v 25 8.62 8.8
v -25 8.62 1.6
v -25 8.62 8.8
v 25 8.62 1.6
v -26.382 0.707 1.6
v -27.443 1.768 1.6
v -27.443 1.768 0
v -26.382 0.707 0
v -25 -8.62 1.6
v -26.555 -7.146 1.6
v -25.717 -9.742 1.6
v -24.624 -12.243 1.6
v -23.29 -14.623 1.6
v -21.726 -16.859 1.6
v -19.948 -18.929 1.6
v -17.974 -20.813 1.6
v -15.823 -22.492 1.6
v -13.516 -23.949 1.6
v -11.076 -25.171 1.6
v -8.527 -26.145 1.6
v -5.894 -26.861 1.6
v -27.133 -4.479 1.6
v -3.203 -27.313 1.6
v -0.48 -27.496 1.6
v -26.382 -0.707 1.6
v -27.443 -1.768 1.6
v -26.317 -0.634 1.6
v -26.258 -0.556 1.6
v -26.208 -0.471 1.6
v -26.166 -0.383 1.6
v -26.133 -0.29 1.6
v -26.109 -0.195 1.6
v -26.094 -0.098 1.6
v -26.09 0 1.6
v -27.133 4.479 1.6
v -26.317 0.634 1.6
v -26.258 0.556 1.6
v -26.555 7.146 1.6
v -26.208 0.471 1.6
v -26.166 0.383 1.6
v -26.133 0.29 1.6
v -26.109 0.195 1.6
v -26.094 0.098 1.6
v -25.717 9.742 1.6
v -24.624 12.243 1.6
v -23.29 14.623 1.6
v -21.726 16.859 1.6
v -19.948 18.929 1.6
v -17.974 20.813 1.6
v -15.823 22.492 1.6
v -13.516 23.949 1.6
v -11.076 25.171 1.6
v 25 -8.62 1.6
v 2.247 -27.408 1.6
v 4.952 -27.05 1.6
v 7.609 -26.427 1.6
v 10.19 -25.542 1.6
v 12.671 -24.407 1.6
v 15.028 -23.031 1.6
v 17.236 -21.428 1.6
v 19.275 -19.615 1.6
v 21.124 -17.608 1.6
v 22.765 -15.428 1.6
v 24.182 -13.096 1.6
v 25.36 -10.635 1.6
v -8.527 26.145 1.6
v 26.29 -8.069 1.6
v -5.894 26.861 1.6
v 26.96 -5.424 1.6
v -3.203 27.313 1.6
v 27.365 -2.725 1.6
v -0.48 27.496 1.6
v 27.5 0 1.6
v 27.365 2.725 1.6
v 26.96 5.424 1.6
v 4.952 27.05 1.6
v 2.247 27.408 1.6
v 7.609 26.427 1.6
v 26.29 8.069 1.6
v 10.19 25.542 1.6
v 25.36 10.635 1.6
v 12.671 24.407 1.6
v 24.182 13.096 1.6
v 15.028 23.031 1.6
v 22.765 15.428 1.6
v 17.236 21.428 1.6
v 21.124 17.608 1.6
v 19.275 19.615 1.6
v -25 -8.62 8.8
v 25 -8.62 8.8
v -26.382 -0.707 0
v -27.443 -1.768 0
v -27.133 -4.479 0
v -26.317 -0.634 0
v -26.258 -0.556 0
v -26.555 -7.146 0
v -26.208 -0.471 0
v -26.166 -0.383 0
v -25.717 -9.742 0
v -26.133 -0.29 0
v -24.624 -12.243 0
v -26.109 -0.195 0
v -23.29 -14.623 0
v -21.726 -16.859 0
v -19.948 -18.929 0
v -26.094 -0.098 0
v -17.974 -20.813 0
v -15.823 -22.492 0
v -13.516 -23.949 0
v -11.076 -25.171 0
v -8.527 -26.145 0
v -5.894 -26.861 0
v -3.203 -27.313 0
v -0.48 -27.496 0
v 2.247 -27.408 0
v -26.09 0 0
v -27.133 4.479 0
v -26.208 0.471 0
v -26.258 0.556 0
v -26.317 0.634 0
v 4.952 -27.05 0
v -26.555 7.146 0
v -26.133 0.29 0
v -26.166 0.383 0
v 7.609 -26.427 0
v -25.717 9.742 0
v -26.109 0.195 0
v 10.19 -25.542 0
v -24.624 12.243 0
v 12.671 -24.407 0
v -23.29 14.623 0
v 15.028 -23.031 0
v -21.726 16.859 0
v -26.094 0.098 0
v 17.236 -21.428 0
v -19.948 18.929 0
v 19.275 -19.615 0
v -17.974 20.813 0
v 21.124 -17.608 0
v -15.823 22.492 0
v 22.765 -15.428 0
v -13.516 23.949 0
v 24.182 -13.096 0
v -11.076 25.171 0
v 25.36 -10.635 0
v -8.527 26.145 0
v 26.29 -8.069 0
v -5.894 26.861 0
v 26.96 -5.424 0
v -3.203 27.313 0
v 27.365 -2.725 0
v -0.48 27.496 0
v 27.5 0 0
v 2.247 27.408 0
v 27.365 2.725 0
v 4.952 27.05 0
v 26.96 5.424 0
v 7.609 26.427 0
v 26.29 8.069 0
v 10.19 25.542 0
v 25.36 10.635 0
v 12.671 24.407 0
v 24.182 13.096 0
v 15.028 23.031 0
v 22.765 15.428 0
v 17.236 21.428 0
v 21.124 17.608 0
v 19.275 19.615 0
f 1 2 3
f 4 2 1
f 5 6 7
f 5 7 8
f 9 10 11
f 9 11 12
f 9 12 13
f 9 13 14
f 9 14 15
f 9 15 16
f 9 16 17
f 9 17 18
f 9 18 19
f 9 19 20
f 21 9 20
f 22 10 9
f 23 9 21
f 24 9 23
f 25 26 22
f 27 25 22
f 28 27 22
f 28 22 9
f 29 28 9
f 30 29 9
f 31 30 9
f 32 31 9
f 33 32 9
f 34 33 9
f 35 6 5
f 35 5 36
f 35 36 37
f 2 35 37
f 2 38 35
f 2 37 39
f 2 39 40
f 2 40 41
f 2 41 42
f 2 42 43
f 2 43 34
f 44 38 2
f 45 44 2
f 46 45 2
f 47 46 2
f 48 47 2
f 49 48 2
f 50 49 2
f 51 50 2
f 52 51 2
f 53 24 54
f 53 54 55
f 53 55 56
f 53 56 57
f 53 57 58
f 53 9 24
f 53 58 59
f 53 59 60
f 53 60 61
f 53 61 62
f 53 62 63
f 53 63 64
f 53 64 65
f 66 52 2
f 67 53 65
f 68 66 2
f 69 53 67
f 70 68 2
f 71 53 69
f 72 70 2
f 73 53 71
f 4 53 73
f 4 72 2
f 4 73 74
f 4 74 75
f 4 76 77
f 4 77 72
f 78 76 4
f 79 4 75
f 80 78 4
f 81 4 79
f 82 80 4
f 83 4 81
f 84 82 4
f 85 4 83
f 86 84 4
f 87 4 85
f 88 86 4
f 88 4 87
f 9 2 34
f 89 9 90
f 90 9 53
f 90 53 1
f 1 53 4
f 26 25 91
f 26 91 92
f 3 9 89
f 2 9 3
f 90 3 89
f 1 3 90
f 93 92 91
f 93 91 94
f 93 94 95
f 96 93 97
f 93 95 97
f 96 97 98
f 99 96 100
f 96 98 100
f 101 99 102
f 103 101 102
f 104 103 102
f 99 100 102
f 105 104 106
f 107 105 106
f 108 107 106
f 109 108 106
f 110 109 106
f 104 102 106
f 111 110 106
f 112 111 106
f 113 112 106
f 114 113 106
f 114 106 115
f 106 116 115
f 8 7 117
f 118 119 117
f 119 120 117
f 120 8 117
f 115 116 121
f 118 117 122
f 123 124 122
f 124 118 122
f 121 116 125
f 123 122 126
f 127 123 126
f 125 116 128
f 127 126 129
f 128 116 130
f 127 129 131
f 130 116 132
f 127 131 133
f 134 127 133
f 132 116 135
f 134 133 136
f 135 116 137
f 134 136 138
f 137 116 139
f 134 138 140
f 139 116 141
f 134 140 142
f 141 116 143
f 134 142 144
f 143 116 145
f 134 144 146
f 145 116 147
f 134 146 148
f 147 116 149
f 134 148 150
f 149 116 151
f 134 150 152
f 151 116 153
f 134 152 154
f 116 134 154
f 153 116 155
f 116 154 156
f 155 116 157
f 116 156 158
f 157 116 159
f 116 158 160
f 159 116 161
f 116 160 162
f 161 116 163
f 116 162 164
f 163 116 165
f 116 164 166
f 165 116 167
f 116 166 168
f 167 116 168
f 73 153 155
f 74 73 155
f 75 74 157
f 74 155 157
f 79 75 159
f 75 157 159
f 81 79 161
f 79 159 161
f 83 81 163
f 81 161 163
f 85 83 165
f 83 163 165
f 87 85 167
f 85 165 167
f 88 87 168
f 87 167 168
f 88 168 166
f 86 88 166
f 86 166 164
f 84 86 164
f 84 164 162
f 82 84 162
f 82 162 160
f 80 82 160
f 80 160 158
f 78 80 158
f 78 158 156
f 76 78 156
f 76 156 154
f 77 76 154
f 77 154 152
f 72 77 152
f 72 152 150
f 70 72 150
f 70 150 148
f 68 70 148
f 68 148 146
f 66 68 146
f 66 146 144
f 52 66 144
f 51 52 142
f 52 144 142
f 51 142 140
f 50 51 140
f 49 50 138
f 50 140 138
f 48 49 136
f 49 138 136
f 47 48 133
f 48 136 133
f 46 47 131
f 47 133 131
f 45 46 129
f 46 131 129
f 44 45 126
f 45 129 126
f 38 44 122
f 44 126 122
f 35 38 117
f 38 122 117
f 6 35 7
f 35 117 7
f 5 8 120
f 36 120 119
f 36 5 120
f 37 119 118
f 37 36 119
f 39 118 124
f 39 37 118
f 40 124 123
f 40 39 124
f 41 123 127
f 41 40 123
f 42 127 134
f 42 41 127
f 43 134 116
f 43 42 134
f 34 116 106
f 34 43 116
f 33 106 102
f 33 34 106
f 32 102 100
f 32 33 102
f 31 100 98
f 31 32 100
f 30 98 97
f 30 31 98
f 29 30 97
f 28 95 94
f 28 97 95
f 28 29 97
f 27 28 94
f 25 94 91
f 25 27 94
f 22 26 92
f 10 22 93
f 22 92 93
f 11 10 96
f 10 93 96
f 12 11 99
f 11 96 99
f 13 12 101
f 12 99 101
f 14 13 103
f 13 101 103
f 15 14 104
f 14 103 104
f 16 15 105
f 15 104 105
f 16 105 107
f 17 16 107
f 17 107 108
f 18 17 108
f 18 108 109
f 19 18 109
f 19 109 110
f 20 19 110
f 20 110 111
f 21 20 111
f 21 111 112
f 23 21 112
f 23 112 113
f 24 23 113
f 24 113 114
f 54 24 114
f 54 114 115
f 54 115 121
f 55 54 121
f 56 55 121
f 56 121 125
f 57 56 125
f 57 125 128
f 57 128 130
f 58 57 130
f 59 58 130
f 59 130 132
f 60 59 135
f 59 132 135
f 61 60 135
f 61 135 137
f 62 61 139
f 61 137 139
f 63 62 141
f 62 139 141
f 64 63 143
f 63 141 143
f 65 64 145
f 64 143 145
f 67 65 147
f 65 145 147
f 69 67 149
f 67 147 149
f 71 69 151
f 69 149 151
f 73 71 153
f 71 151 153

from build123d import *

# Parameters (mm, degrees)
SKETCH_1_R          = 27.5
EXTRUDE_1_DEPTH     = 1.6
SKETCH_2_W          = 50
SKETCH_2_H          = 17.24
EXTRUDE_2_DEPTH     = 7.2
CUT_EXTRUDE_1_DEPTH = 40.551738268


with BuildPart() as part:
    # 草图1 → 凸台-拉伸1 (new body)
    with BuildSketch(Plane.XY):
        Circle(SKETCH_1_R)
    extrude(amount=EXTRUDE_1_DEPTH)

    # 草图2 → 凸台-拉伸2 (add)
    with BuildSketch(Plane.XY.offset(1.6)):
        Rectangle(SKETCH_2_W, SKETCH_2_H)
    extrude(amount=EXTRUDE_2_DEPTH)

    # 草图3 → 切除-拉伸1 (cut, through all)
    with BuildSketch(Plane.XY.offset(1.6)):
        with BuildLine():
            Line((-27.443123, 1.767766953), (-26.382462828, 0.707106781))
            ThreePointArc((-26.382462828, 0.707106781), (-26.08956961, 0), (-26.382462828, -0.707106781))
            Line((-26.382462828, -0.707106781), (-27.443123, -1.767766953))
            ThreePointArc((-27.443123, -1.767766953), (-27.5, 0), (-27.443123, 1.767766953))
        make_face()
    extrude(amount=-CUT_EXTRUDE_1_DEPTH, mode=Mode.SUBTRACT)


solid = part.part
